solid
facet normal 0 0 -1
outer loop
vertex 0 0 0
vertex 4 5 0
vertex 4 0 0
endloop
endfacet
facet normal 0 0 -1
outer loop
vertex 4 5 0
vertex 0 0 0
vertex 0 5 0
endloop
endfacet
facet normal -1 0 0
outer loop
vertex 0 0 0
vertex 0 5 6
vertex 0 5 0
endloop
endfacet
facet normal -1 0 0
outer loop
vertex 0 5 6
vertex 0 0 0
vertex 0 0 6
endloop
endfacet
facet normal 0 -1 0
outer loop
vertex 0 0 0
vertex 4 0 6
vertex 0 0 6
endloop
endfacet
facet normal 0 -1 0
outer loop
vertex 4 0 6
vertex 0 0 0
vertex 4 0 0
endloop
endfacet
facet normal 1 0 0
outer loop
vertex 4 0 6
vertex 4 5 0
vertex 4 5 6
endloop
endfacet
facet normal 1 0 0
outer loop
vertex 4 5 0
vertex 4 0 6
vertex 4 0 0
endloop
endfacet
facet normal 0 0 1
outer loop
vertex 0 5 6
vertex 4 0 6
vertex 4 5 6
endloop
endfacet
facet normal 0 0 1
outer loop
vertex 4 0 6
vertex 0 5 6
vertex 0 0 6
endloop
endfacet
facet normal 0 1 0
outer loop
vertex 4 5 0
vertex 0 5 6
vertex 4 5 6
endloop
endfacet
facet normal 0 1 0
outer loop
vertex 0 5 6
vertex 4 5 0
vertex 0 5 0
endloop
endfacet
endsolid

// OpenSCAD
cube([1,2,3]);
union() {
	cube([4,5,6]);
}
union() {
	union() {
		cube([4,5,6]);
	}
}
